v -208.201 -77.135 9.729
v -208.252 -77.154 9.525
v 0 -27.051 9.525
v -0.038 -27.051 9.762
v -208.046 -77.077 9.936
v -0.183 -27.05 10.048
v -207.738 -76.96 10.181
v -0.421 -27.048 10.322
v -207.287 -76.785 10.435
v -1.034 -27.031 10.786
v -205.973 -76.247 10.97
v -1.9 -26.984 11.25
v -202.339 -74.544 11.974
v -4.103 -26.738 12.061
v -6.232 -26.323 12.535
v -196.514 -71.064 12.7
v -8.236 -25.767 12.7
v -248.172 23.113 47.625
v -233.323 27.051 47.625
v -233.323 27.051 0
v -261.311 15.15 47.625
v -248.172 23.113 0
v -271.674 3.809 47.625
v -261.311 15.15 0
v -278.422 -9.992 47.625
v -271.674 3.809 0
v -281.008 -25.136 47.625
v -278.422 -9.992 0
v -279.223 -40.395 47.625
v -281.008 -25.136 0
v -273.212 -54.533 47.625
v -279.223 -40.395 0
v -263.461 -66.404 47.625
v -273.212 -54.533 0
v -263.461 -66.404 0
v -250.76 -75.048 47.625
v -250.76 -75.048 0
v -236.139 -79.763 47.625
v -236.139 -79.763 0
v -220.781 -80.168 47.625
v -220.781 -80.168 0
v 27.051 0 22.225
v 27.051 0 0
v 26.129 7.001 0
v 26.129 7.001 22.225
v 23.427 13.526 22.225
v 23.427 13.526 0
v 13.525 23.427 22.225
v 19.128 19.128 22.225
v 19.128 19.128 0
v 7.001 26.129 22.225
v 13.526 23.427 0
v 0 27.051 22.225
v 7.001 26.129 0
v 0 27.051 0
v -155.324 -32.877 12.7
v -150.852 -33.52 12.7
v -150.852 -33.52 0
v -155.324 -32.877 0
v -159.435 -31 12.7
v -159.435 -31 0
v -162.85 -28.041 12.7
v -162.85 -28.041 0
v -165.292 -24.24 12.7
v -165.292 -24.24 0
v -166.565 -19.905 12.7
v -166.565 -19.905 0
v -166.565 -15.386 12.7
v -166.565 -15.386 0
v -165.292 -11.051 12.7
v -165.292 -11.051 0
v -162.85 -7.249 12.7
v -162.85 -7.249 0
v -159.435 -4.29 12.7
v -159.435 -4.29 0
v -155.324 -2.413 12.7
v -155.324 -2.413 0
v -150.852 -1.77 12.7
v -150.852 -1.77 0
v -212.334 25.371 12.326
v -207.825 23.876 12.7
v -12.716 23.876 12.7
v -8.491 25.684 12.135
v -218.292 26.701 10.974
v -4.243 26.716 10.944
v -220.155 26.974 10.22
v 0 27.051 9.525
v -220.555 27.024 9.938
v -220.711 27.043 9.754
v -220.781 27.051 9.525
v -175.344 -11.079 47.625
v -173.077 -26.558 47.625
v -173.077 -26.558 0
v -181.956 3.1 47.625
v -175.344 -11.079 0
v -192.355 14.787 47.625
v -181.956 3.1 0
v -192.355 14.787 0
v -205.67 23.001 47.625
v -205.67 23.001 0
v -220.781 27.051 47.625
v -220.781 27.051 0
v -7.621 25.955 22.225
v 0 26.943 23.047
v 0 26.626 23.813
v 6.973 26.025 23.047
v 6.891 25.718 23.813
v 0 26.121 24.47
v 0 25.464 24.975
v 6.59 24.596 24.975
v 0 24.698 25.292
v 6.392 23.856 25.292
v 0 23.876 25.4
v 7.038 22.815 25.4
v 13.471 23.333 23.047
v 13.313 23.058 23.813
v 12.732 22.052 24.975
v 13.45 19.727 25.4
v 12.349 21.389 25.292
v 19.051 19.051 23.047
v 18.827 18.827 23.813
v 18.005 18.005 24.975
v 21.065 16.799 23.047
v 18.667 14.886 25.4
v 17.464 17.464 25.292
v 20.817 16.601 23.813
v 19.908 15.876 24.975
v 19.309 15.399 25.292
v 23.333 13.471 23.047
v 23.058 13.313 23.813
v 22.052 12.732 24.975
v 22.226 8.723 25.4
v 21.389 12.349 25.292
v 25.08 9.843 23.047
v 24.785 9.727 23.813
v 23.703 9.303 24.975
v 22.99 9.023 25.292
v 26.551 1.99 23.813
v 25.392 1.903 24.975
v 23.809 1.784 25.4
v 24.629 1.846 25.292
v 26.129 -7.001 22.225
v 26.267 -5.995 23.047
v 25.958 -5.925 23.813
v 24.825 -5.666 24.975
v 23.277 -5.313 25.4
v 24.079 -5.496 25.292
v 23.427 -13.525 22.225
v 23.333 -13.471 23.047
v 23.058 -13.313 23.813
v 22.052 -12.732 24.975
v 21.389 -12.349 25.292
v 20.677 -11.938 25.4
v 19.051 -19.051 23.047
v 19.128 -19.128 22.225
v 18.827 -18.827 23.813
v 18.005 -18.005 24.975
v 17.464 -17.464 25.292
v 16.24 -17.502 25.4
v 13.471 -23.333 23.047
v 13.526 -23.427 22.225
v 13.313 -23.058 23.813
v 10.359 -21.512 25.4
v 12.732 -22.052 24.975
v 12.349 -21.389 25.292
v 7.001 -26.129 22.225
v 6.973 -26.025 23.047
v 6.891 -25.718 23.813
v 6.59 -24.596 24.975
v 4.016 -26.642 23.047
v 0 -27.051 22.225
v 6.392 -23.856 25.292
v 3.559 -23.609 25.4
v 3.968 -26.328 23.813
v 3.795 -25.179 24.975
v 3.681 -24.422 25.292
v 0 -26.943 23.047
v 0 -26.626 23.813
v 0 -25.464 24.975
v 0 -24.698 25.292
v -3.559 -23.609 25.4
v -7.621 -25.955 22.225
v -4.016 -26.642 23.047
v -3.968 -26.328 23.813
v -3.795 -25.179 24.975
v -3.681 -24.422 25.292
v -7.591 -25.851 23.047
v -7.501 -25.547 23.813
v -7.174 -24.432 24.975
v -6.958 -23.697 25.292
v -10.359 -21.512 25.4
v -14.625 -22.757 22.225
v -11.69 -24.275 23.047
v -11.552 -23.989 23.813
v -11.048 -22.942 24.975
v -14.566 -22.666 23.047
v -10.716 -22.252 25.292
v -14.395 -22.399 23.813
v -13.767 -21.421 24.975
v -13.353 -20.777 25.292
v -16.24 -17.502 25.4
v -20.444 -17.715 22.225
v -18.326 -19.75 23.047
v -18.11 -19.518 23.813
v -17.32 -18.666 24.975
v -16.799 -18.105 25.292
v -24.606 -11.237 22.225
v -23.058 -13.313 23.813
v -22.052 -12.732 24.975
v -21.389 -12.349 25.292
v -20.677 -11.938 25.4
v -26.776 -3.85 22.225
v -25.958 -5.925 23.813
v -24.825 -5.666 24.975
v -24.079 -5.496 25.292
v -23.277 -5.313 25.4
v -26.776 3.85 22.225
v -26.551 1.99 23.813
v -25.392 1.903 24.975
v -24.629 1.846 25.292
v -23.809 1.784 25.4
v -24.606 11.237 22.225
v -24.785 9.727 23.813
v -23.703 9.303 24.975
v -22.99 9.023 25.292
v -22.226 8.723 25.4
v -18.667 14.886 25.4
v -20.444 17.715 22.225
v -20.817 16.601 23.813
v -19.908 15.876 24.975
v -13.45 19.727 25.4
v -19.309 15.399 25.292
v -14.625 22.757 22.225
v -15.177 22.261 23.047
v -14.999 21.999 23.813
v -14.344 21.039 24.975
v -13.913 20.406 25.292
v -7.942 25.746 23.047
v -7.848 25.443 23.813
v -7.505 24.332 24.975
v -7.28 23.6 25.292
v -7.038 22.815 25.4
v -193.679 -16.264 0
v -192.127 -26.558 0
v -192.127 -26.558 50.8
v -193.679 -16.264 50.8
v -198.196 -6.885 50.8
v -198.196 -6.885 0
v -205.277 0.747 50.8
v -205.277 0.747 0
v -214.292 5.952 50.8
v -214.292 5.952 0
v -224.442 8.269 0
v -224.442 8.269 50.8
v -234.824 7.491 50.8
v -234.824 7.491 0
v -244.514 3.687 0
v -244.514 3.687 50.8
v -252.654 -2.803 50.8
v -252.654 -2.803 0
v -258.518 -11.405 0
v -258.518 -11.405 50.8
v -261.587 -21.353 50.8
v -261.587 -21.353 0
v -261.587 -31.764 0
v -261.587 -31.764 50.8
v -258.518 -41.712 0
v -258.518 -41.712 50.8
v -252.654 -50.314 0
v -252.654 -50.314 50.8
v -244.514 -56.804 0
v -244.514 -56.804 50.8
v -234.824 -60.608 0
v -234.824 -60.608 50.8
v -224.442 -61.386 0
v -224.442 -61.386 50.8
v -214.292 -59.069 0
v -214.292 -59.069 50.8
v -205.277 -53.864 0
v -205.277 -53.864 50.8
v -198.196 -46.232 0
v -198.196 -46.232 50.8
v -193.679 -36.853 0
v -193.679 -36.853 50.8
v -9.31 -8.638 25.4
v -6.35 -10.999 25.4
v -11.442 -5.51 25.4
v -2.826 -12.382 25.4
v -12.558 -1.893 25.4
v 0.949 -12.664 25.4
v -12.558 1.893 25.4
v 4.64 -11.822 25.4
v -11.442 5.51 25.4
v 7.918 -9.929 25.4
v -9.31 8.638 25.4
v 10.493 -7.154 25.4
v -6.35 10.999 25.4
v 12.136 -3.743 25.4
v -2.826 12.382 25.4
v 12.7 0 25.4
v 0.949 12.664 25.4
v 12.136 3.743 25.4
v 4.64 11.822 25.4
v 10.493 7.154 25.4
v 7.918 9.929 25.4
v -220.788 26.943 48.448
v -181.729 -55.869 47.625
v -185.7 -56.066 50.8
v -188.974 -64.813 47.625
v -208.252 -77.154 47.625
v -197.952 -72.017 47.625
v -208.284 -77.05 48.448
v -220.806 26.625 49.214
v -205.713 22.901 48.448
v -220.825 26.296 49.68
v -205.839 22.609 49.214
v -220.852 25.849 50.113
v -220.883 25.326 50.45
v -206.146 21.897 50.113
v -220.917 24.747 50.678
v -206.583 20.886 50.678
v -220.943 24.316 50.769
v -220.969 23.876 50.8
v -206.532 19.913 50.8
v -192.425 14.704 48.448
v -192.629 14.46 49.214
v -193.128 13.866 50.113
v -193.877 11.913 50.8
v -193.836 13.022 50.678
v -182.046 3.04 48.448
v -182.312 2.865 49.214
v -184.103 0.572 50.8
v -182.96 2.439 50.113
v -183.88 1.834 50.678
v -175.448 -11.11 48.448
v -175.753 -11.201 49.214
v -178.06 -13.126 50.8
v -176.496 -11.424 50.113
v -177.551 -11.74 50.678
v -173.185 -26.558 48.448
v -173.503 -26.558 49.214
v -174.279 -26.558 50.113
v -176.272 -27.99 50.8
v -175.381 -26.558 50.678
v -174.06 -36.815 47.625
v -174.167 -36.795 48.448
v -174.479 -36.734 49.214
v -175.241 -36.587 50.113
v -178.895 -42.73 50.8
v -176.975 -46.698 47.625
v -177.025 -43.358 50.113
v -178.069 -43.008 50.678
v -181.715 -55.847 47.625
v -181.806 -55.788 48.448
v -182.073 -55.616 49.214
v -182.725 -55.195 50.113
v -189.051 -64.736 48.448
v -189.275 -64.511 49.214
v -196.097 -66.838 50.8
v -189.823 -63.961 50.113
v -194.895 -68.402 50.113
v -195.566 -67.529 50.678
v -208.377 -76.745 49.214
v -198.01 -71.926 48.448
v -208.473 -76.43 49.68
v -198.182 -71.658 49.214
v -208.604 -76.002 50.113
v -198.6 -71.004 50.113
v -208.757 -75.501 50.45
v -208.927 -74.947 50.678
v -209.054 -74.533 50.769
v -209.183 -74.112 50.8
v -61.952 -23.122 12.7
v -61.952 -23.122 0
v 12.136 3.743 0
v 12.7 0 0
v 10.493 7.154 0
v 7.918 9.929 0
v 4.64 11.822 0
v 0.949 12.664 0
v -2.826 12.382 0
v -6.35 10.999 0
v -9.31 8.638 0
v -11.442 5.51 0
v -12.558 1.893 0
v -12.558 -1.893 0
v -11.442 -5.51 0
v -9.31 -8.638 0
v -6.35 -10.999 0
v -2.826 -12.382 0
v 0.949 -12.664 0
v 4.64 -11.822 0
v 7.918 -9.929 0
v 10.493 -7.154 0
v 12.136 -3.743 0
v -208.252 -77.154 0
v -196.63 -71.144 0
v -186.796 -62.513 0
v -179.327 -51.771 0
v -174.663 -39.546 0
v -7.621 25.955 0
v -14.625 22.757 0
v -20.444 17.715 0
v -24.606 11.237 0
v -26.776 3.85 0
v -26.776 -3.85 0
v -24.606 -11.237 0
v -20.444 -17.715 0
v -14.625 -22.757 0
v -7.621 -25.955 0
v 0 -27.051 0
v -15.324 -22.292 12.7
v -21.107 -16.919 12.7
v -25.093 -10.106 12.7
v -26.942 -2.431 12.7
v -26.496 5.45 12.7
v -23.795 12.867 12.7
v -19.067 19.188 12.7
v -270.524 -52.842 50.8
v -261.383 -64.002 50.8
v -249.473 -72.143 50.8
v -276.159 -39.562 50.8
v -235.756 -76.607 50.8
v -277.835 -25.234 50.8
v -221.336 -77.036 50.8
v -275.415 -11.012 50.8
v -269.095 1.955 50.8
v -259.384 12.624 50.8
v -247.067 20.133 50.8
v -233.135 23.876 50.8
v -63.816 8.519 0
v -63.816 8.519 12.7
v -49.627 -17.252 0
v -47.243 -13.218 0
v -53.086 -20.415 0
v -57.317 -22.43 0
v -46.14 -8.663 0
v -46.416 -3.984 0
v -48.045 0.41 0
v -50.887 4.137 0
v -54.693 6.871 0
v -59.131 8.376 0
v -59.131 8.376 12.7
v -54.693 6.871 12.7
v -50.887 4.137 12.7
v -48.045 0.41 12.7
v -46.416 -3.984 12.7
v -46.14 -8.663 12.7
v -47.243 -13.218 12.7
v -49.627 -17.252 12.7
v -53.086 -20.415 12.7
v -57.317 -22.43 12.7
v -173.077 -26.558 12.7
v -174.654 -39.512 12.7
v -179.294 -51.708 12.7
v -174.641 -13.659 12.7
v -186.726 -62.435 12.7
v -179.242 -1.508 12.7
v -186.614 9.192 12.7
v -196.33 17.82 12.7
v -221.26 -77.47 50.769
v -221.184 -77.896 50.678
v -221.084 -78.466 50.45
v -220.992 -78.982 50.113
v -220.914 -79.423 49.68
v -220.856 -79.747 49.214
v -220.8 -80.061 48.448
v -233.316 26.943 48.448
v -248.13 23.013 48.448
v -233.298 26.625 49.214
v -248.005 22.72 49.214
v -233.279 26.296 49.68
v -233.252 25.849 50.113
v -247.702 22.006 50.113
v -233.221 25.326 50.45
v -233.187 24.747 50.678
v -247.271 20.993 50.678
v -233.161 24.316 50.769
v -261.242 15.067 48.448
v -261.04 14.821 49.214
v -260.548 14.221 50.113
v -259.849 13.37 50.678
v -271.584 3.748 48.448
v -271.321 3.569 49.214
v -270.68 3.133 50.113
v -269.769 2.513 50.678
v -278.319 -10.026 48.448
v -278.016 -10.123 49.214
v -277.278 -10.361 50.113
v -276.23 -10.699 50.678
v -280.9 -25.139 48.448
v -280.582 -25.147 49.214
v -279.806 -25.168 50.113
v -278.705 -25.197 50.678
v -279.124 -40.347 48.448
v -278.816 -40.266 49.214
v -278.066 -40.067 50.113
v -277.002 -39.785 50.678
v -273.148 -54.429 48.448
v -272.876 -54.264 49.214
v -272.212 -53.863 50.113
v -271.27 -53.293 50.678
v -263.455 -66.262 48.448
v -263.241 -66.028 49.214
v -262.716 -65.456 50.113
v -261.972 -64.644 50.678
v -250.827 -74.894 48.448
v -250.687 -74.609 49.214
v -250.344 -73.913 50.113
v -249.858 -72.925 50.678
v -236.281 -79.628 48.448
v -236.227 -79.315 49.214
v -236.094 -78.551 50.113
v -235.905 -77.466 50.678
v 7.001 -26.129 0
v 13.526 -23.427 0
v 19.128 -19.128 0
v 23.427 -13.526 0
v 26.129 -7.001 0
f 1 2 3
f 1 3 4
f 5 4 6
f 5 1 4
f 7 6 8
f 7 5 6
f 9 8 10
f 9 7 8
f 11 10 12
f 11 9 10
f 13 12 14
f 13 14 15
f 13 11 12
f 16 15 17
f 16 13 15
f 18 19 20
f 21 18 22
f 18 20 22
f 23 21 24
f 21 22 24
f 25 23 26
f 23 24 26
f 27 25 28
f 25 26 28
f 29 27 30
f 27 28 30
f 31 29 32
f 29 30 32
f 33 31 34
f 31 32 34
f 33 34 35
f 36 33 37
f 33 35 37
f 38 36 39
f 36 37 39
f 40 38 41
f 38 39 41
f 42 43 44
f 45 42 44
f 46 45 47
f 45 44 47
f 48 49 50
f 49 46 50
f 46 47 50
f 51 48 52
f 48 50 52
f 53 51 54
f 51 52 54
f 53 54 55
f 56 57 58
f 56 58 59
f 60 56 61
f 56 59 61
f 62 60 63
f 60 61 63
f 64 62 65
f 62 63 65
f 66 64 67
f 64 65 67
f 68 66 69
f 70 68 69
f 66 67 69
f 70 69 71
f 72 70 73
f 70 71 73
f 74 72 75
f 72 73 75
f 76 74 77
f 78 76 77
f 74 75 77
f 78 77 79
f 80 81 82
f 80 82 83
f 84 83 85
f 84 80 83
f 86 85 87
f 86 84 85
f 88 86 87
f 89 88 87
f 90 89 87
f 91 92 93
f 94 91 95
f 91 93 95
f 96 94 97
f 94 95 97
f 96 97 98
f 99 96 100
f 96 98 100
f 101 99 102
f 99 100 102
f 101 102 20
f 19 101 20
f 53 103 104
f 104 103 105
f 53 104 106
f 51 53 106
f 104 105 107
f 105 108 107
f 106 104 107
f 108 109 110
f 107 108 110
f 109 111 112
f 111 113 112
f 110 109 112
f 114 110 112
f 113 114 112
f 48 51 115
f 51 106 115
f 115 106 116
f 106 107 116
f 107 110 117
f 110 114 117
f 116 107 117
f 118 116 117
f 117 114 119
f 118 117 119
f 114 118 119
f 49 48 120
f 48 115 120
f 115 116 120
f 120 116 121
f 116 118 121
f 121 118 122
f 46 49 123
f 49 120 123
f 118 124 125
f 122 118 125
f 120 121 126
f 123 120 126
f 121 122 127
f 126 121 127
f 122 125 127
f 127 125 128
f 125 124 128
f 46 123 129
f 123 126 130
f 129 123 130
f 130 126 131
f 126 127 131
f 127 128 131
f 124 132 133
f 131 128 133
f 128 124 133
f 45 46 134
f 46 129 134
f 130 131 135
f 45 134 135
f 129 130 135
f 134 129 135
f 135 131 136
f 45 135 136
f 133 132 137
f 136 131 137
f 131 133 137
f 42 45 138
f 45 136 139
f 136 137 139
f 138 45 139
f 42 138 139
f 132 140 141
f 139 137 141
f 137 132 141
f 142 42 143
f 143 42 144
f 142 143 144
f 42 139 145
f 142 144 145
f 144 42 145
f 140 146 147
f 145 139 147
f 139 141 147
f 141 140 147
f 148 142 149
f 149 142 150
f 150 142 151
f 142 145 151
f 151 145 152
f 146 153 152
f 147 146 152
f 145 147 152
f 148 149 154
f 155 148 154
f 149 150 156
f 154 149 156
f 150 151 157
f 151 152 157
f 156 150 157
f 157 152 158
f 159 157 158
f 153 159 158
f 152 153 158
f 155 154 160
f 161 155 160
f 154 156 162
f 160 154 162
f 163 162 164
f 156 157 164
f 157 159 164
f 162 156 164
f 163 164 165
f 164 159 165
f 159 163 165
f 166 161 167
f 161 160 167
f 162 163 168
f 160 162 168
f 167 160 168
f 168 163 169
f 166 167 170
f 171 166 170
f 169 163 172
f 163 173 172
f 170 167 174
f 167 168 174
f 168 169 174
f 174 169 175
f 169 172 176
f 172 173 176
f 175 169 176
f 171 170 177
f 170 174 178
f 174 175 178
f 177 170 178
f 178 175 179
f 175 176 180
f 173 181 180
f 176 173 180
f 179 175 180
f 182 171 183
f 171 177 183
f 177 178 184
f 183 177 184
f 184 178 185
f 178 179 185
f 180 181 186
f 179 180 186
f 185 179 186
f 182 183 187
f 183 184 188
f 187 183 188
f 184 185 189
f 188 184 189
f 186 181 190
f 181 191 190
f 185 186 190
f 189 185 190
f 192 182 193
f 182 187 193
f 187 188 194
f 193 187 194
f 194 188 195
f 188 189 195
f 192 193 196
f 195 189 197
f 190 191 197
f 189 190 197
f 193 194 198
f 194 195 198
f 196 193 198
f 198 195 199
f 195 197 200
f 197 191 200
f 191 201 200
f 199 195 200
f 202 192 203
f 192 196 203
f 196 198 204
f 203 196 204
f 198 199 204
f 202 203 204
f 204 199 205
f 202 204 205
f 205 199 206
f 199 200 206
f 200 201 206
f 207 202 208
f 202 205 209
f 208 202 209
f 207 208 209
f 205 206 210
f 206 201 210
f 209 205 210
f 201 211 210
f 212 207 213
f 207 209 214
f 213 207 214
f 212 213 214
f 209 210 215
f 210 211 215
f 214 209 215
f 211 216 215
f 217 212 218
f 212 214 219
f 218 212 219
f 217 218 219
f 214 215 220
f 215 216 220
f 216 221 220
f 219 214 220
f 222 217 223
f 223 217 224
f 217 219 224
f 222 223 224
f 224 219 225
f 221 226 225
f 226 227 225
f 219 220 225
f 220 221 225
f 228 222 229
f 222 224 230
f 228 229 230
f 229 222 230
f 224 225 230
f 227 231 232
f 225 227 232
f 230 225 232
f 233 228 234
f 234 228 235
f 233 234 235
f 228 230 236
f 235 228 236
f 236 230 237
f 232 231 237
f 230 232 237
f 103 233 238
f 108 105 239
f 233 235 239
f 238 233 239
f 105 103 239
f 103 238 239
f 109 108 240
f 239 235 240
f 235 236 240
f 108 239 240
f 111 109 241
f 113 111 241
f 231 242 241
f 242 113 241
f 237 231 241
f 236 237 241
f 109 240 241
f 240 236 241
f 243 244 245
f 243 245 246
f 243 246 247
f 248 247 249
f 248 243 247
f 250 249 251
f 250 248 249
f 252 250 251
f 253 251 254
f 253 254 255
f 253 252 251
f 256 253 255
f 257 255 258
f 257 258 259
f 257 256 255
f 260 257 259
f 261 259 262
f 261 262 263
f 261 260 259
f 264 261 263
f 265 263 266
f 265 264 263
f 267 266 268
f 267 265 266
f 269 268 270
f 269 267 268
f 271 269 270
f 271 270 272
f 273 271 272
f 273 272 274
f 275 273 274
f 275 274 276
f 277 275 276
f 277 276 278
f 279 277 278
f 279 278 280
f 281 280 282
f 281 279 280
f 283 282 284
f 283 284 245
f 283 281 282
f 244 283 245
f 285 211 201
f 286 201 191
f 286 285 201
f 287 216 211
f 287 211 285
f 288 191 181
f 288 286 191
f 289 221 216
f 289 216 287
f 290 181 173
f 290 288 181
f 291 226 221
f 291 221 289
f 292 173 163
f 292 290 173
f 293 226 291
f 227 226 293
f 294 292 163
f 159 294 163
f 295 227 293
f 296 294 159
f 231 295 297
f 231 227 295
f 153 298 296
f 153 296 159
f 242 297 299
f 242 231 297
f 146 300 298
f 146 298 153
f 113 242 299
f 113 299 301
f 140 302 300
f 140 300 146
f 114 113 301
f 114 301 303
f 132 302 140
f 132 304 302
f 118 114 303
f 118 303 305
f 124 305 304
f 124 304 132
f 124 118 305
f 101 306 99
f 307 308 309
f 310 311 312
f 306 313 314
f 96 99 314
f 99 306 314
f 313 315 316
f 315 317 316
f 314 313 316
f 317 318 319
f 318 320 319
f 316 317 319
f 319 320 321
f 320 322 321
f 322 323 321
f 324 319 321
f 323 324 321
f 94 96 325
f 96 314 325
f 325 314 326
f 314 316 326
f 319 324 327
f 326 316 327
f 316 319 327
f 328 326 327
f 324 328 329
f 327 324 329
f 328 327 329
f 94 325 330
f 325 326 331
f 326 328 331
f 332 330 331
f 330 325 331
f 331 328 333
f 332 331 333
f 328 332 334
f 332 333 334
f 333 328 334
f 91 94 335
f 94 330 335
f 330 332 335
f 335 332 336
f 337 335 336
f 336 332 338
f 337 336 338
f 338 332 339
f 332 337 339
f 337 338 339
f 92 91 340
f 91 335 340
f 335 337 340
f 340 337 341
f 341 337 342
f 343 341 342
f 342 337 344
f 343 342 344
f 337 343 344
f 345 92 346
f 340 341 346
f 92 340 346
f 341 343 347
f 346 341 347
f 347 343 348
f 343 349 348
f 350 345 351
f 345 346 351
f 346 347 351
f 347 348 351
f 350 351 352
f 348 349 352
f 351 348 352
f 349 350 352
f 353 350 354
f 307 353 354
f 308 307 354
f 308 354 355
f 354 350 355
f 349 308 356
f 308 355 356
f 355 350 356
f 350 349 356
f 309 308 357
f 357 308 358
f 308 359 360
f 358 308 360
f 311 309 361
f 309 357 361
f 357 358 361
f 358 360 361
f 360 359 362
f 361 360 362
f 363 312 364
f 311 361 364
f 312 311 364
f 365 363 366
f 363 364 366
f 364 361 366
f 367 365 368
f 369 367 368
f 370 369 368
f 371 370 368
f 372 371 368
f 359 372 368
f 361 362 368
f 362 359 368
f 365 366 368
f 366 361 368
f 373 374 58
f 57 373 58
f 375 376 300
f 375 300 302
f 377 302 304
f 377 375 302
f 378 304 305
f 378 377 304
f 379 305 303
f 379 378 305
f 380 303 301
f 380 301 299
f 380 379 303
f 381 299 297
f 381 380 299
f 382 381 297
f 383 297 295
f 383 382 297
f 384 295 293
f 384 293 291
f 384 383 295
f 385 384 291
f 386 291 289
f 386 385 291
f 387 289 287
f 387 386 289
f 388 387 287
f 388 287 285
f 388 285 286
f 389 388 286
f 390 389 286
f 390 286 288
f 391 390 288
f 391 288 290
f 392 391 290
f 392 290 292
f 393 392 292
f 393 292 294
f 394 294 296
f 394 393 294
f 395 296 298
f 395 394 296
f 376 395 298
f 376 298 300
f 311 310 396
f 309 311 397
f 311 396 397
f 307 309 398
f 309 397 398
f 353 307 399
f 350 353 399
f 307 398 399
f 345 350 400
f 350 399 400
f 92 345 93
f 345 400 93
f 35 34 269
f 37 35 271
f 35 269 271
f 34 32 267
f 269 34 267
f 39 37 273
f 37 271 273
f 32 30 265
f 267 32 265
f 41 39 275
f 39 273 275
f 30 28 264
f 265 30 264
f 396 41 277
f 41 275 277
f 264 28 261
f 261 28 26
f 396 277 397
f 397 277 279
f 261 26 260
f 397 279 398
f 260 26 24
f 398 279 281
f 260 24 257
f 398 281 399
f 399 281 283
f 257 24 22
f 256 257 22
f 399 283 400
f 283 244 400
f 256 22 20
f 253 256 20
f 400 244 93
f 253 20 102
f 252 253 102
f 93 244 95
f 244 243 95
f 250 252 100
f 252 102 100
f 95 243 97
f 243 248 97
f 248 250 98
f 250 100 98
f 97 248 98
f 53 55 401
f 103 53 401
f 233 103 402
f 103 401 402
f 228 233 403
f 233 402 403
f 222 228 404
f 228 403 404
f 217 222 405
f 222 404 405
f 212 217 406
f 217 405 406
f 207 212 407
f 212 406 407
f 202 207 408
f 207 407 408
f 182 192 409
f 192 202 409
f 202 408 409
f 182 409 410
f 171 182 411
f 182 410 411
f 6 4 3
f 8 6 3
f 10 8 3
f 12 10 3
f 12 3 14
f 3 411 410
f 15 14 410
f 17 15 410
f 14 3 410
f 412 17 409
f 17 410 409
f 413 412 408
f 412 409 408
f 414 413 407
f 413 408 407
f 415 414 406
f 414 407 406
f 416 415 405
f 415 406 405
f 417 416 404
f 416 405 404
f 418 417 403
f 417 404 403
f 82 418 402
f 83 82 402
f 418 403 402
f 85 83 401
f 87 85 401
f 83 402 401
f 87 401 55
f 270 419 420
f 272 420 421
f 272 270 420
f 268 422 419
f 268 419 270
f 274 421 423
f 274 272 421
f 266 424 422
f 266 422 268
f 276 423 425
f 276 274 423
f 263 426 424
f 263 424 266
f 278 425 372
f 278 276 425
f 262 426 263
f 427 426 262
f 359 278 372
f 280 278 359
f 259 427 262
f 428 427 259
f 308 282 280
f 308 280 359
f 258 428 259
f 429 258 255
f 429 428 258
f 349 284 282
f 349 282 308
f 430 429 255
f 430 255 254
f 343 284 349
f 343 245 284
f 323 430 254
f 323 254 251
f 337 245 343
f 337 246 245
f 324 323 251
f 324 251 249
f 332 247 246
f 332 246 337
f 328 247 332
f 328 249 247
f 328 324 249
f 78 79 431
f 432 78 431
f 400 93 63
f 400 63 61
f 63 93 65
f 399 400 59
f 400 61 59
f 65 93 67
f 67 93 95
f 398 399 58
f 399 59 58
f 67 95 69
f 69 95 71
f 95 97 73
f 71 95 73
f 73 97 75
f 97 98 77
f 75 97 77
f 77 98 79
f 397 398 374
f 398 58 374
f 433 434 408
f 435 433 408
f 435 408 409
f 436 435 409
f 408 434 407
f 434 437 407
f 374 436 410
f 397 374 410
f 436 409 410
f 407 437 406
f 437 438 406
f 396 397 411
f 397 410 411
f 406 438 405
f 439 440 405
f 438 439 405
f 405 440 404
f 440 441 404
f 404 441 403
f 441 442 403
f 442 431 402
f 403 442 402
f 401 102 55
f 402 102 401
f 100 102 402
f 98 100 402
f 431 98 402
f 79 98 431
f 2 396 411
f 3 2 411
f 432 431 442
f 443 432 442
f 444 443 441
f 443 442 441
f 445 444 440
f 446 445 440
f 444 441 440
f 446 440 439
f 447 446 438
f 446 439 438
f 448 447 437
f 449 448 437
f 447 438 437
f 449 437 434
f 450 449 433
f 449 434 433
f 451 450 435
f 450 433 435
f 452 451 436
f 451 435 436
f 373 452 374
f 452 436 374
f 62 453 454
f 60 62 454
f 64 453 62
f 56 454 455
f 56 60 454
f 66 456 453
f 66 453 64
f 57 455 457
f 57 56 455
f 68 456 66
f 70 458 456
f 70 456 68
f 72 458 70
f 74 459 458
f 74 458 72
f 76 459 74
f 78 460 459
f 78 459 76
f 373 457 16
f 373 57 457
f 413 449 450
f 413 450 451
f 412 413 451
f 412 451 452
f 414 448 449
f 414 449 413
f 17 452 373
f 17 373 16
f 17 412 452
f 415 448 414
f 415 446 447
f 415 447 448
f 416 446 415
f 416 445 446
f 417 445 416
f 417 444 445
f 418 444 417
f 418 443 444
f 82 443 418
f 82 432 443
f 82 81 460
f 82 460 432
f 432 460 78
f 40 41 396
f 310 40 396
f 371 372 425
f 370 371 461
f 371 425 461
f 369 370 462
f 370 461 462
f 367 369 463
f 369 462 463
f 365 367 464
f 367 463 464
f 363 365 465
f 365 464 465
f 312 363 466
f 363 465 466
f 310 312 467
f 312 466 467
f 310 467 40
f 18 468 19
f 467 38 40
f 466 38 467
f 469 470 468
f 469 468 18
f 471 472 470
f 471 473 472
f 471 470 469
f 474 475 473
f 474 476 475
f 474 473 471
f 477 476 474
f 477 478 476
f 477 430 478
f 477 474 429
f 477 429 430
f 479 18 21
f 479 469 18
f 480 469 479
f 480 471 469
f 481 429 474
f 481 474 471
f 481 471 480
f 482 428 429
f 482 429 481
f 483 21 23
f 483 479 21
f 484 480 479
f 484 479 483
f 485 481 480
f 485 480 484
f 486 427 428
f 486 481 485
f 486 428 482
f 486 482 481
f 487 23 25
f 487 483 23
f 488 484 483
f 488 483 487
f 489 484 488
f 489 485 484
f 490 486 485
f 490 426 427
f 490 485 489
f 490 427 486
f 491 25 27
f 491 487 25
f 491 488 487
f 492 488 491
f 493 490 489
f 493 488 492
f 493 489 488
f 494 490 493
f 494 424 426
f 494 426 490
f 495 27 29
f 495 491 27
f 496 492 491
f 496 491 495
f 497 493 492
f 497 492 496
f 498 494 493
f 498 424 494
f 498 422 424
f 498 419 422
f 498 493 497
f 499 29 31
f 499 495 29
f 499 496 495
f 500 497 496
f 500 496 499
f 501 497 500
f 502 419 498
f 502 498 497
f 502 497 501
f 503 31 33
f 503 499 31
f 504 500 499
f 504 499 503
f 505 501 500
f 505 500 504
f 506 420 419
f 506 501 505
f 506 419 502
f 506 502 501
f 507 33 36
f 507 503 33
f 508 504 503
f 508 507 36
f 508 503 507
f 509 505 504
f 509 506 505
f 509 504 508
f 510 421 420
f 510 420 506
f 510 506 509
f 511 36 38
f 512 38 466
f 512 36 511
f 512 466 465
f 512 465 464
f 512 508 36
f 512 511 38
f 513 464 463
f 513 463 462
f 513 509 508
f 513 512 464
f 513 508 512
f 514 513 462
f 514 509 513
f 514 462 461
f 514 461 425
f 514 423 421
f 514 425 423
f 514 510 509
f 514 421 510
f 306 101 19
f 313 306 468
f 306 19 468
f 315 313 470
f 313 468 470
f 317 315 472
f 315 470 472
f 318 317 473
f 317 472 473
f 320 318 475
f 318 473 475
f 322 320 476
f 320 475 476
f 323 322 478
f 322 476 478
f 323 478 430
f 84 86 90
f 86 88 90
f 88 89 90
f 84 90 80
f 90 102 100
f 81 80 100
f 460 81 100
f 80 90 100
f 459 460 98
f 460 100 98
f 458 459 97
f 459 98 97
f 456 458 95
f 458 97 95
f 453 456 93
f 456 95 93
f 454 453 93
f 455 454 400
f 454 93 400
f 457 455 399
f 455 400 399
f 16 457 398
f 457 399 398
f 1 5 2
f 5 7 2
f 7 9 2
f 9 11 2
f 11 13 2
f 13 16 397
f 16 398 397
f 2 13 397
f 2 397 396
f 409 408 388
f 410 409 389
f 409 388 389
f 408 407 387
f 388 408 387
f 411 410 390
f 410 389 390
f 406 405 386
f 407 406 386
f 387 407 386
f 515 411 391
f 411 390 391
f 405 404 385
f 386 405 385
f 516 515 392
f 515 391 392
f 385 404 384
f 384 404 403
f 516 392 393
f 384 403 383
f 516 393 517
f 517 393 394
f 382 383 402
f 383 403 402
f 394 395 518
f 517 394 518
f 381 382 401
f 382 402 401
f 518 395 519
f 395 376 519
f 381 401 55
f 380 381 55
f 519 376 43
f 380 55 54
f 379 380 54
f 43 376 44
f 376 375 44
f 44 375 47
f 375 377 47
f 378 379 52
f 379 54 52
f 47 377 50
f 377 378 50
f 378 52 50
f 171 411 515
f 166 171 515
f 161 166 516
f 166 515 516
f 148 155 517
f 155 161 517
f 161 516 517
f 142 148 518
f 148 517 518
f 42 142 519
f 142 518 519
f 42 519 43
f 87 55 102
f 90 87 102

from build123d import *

# Parameters (mm, degrees)
F0_R          = 34.925
F1_DEPTH      = 50.8
F0_R_2        = 12.7
F2_DEPTH      = 25.4
F3_DEPTH      = 12.7
F4_T1_DEPTH   = 39.8737412721
F4_T3_DEPTH   = 39.5290127835
F4_T6_ANGLE   = 196.8788005765
F4_T8_ANGLE   = 169.8162488072
F4_3_T1_DEPTH = 273.9624836944
F4_3_T3_DEPTH = 277.6947318263


# Not quite as in the source:
# - a fillet or chamfer that OpenCascade refuses, or shapes differently, is made with other operations: its cross-section is extruded or revolved along the edge and cut away or added


with BuildPart() as f1:
    # F0 (on Top) → F1 (new body)
    with BuildSketch(Plane.XY):
        with BuildLine():
            ThreePointArc((-173.0769900862, -26.5584976592), (-186.7297586174, 9.3221137399), (-220.7812336944, 27.051))
            Line((-220.7812336944, 27.051), (-233.3227464779, 27.051))
            ThreePointArc((-233.3227464779, 27.051), (-280.6614877454, -32.829254051), (-220.7812336944, -80.1679953185))
            Line((-220.7812336944, -80.1679953185), (-208.2524858785, -77.1537471057))
            ThreePointArc((-208.2524858785, -77.1537471057), (-182.7349286729, -57.3691888669), (-173.0769900862, -26.5584976592))
        make_face()
        with Locations((-227.0519900862, -26.5584976592)):
            Circle(F0_R, mode=Mode.SUBTRACT)
    extrude(amount=F1_DEPTH)

    # F4: fillet of radius 3.175 on 4 edges, made by hand

    # F4_s2 → F4_t1 (cut)
    with BuildSketch(Plane(origin=(-240.0526530104, -57.7534396052, 0), x_dir=(0, 0, 1), z_dir=(0.97225774, 0.2339121354, 0))):
        with BuildLine():
            ThreePointArc((50.8, 23.1255441239), (49.8700640303, 25.3706081542), (47.625, 26.3005441239))
            Line((47.625, 26.3005441239), (50.8, 26.3005441239))
            Line((50.8, 26.3005441239), (50.8, 23.1255441239))
        make_face()
    extrude(amount=F4_T1_DEPTH, mode=Mode.SUBTRACT)

    # F4_s4 → F4_t3 (cut)
    with BuildSketch(Plane.YZ.offset(-246.8164964779)):
        with BuildLine():
            ThreePointArc((27.051, 47.625), (26.1210640303, 49.8700640303), (23.876, 50.8))
            Line((23.876, 50.8), (27.051, 50.8))
            Line((27.051, 50.8), (27.051, 47.625))
        make_face()
    extrude(amount=F4_T3_DEPTH, mode=Mode.SUBTRACT)

    # F4_s5 → F4_t6 (revolve, cut)
    with BuildSketch(Plane(origin=(-226.0170180044, 6.9756210319, 0), x_dir=(0, 0, 1), z_dir=(0.9995240697, -0.030848567, 0))):
        with BuildLine():
            ThreePointArc((47.625, -20.4249138064), (49.8700640303, -19.4949778367), (50.8, -17.2499138064))
            Line((50.8, -17.2499138064), (50.8, -20.4249138064))
            Line((50.8, -20.4249138064), (47.625, -20.4249138064))
        make_face()
    revolve(axis=Axis((-227.0519900862, -26.5584976592, 50.8), (0, 0, 1)), revolution_arc=F4_T6_ANGLE, mode=Mode.SUBTRACT)

    # F4_s7 → F4_t8 (revolve, cut)
    with BuildSketch(Plane(origin=(-227.653997391, -7.0111486331, 0), x_dir=(0, 0, 1), z_dir=(-0.9995260975, -0.0307827937, 0))):
        with BuildLine():
            ThreePointArc((47.625, 34.4183830445), (49.8700640303, 33.4884470747), (50.8, 31.2433830445))
            Line((50.8, 31.2433830445), (50.8, 34.4183830445))
            Line((50.8, 34.4183830445), (47.625, 34.4183830445))
        make_face()
    revolve(axis=Axis((-227.0519900862, -26.5584976592, 50.8), (0, 0, -1)), revolution_arc=F4_T8_ANGLE, mode=Mode.SUBTRACT)


with BuildPart() as f2:
    # F0 (on Top) → F2 (new body)
    with BuildSketch(Plane.XY):
        with BuildLine():
            ThreePointArc((0, -27.051), (19.1279455379, -19.1279455379), (27.051, 0))
            ThreePointArc((27.051, 0), (19.1279455379, 19.1279455379), (0, 27.051))
            ThreePointArc((0, 27.051), (-27.051, 0), (0, -27.051))
        make_face()
        Circle(F0_R_2, mode=Mode.SUBTRACT)
    extrude(amount=F2_DEPTH)

    # F4#2: fillet of radius 3.175 on 1 edges, made by hand

    # F4_2_s1 → F4_2_t2 (revolve, cut)
    with BuildSketch(Plane.YZ):
        with BuildLine():
            ThreePointArc((27.051, 22.225), (26.1210640303, 24.4700640303), (23.876, 25.4))
            Line((23.876, 25.4), (27.051, 25.4))
            Line((27.051, 25.4), (27.051, 22.225))
        make_face()
    revolve(axis=Axis((0, 0, 25.4), (0, 0, -1)), mode=Mode.SUBTRACT)


with BuildPart() as f3:
    # F0 (on Top) → F3 (new body)
    with BuildSketch(Plane.XY):
        with BuildLine():
            ThreePointArc((0, -27.051), (-27.051, 0), (0, 27.051))
            Line((0, 27.051), (-220.7812336944, 27.051))
            ThreePointArc((-220.7812336944, 27.051), (-186.7297586174, 9.3221137399), (-173.0769900862, -26.5584976592))
            ThreePointArc((-173.0769900862, -26.5584976592), (-182.7349286729, -57.3691888669), (-208.2524858785, -77.1537471057))
            Line((-208.2524858785, -77.1537471057), (0, -27.051))
        make_face()
        with BuildLine():
            ThreePointArc((-150.8519900862, -33.5203076851), (-166.7269900862, -17.6453076851), (-150.8519900862, -1.7703076851))
            Line((-150.8519900862, -1.7703076851), (-63.8156668227, 8.5186394182))
            ThreePointArc((-63.8156668227, 8.5186394182), (-46.1044574819, -6.3131325916), (-61.9519900862, -23.1215860487))
            Line((-61.9519900862, -23.1215860487), (-150.8519900862, -33.5203076851))
        make_face(mode=Mode.SUBTRACT)
    extrude(amount=F3_DEPTH)

    # F4#3: fillet of radius 3.175 on 2 edges, made by hand

    # F4_3_s2 → F4_3_t1 (cut)
    with BuildSketch(Plane.YZ.offset(-260.4687336944)):
        with BuildLine():
            ThreePointArc((23.876, 12.7), (26.1210640303, 11.7700640303), (27.051, 9.525))
            Line((27.051, 9.525), (27.051, 12.7))
            Line((27.051, 12.7), (23.876, 12.7))
        make_face()
    extrude(amount=F4_3_T1_DEPTH, mode=Mode.SUBTRACT)

    # F4_3_s4 → F4_3_t3 (cut)
    with BuildSketch(Plane(origin=(-252.9909813708, -60.8662273882, 0), x_dir=(0, 0, 1), z_dir=(0.97225774, 0.2339121354, 0))):
        with BuildLine():
            ThreePointArc((9.525, 26.3005441239), (11.7700640303, 25.3706081542), (12.7, 23.1255441239))
            Line((12.7, 23.1255441239), (12.7, 26.3005441239))
            Line((12.7, 26.3005441239), (9.525, 26.3005441239))
        make_face()
    extrude(amount=F4_3_T3_DEPTH, mode=Mode.SUBTRACT)


solid = Compound([f1.part, f2.part, f3.part])
